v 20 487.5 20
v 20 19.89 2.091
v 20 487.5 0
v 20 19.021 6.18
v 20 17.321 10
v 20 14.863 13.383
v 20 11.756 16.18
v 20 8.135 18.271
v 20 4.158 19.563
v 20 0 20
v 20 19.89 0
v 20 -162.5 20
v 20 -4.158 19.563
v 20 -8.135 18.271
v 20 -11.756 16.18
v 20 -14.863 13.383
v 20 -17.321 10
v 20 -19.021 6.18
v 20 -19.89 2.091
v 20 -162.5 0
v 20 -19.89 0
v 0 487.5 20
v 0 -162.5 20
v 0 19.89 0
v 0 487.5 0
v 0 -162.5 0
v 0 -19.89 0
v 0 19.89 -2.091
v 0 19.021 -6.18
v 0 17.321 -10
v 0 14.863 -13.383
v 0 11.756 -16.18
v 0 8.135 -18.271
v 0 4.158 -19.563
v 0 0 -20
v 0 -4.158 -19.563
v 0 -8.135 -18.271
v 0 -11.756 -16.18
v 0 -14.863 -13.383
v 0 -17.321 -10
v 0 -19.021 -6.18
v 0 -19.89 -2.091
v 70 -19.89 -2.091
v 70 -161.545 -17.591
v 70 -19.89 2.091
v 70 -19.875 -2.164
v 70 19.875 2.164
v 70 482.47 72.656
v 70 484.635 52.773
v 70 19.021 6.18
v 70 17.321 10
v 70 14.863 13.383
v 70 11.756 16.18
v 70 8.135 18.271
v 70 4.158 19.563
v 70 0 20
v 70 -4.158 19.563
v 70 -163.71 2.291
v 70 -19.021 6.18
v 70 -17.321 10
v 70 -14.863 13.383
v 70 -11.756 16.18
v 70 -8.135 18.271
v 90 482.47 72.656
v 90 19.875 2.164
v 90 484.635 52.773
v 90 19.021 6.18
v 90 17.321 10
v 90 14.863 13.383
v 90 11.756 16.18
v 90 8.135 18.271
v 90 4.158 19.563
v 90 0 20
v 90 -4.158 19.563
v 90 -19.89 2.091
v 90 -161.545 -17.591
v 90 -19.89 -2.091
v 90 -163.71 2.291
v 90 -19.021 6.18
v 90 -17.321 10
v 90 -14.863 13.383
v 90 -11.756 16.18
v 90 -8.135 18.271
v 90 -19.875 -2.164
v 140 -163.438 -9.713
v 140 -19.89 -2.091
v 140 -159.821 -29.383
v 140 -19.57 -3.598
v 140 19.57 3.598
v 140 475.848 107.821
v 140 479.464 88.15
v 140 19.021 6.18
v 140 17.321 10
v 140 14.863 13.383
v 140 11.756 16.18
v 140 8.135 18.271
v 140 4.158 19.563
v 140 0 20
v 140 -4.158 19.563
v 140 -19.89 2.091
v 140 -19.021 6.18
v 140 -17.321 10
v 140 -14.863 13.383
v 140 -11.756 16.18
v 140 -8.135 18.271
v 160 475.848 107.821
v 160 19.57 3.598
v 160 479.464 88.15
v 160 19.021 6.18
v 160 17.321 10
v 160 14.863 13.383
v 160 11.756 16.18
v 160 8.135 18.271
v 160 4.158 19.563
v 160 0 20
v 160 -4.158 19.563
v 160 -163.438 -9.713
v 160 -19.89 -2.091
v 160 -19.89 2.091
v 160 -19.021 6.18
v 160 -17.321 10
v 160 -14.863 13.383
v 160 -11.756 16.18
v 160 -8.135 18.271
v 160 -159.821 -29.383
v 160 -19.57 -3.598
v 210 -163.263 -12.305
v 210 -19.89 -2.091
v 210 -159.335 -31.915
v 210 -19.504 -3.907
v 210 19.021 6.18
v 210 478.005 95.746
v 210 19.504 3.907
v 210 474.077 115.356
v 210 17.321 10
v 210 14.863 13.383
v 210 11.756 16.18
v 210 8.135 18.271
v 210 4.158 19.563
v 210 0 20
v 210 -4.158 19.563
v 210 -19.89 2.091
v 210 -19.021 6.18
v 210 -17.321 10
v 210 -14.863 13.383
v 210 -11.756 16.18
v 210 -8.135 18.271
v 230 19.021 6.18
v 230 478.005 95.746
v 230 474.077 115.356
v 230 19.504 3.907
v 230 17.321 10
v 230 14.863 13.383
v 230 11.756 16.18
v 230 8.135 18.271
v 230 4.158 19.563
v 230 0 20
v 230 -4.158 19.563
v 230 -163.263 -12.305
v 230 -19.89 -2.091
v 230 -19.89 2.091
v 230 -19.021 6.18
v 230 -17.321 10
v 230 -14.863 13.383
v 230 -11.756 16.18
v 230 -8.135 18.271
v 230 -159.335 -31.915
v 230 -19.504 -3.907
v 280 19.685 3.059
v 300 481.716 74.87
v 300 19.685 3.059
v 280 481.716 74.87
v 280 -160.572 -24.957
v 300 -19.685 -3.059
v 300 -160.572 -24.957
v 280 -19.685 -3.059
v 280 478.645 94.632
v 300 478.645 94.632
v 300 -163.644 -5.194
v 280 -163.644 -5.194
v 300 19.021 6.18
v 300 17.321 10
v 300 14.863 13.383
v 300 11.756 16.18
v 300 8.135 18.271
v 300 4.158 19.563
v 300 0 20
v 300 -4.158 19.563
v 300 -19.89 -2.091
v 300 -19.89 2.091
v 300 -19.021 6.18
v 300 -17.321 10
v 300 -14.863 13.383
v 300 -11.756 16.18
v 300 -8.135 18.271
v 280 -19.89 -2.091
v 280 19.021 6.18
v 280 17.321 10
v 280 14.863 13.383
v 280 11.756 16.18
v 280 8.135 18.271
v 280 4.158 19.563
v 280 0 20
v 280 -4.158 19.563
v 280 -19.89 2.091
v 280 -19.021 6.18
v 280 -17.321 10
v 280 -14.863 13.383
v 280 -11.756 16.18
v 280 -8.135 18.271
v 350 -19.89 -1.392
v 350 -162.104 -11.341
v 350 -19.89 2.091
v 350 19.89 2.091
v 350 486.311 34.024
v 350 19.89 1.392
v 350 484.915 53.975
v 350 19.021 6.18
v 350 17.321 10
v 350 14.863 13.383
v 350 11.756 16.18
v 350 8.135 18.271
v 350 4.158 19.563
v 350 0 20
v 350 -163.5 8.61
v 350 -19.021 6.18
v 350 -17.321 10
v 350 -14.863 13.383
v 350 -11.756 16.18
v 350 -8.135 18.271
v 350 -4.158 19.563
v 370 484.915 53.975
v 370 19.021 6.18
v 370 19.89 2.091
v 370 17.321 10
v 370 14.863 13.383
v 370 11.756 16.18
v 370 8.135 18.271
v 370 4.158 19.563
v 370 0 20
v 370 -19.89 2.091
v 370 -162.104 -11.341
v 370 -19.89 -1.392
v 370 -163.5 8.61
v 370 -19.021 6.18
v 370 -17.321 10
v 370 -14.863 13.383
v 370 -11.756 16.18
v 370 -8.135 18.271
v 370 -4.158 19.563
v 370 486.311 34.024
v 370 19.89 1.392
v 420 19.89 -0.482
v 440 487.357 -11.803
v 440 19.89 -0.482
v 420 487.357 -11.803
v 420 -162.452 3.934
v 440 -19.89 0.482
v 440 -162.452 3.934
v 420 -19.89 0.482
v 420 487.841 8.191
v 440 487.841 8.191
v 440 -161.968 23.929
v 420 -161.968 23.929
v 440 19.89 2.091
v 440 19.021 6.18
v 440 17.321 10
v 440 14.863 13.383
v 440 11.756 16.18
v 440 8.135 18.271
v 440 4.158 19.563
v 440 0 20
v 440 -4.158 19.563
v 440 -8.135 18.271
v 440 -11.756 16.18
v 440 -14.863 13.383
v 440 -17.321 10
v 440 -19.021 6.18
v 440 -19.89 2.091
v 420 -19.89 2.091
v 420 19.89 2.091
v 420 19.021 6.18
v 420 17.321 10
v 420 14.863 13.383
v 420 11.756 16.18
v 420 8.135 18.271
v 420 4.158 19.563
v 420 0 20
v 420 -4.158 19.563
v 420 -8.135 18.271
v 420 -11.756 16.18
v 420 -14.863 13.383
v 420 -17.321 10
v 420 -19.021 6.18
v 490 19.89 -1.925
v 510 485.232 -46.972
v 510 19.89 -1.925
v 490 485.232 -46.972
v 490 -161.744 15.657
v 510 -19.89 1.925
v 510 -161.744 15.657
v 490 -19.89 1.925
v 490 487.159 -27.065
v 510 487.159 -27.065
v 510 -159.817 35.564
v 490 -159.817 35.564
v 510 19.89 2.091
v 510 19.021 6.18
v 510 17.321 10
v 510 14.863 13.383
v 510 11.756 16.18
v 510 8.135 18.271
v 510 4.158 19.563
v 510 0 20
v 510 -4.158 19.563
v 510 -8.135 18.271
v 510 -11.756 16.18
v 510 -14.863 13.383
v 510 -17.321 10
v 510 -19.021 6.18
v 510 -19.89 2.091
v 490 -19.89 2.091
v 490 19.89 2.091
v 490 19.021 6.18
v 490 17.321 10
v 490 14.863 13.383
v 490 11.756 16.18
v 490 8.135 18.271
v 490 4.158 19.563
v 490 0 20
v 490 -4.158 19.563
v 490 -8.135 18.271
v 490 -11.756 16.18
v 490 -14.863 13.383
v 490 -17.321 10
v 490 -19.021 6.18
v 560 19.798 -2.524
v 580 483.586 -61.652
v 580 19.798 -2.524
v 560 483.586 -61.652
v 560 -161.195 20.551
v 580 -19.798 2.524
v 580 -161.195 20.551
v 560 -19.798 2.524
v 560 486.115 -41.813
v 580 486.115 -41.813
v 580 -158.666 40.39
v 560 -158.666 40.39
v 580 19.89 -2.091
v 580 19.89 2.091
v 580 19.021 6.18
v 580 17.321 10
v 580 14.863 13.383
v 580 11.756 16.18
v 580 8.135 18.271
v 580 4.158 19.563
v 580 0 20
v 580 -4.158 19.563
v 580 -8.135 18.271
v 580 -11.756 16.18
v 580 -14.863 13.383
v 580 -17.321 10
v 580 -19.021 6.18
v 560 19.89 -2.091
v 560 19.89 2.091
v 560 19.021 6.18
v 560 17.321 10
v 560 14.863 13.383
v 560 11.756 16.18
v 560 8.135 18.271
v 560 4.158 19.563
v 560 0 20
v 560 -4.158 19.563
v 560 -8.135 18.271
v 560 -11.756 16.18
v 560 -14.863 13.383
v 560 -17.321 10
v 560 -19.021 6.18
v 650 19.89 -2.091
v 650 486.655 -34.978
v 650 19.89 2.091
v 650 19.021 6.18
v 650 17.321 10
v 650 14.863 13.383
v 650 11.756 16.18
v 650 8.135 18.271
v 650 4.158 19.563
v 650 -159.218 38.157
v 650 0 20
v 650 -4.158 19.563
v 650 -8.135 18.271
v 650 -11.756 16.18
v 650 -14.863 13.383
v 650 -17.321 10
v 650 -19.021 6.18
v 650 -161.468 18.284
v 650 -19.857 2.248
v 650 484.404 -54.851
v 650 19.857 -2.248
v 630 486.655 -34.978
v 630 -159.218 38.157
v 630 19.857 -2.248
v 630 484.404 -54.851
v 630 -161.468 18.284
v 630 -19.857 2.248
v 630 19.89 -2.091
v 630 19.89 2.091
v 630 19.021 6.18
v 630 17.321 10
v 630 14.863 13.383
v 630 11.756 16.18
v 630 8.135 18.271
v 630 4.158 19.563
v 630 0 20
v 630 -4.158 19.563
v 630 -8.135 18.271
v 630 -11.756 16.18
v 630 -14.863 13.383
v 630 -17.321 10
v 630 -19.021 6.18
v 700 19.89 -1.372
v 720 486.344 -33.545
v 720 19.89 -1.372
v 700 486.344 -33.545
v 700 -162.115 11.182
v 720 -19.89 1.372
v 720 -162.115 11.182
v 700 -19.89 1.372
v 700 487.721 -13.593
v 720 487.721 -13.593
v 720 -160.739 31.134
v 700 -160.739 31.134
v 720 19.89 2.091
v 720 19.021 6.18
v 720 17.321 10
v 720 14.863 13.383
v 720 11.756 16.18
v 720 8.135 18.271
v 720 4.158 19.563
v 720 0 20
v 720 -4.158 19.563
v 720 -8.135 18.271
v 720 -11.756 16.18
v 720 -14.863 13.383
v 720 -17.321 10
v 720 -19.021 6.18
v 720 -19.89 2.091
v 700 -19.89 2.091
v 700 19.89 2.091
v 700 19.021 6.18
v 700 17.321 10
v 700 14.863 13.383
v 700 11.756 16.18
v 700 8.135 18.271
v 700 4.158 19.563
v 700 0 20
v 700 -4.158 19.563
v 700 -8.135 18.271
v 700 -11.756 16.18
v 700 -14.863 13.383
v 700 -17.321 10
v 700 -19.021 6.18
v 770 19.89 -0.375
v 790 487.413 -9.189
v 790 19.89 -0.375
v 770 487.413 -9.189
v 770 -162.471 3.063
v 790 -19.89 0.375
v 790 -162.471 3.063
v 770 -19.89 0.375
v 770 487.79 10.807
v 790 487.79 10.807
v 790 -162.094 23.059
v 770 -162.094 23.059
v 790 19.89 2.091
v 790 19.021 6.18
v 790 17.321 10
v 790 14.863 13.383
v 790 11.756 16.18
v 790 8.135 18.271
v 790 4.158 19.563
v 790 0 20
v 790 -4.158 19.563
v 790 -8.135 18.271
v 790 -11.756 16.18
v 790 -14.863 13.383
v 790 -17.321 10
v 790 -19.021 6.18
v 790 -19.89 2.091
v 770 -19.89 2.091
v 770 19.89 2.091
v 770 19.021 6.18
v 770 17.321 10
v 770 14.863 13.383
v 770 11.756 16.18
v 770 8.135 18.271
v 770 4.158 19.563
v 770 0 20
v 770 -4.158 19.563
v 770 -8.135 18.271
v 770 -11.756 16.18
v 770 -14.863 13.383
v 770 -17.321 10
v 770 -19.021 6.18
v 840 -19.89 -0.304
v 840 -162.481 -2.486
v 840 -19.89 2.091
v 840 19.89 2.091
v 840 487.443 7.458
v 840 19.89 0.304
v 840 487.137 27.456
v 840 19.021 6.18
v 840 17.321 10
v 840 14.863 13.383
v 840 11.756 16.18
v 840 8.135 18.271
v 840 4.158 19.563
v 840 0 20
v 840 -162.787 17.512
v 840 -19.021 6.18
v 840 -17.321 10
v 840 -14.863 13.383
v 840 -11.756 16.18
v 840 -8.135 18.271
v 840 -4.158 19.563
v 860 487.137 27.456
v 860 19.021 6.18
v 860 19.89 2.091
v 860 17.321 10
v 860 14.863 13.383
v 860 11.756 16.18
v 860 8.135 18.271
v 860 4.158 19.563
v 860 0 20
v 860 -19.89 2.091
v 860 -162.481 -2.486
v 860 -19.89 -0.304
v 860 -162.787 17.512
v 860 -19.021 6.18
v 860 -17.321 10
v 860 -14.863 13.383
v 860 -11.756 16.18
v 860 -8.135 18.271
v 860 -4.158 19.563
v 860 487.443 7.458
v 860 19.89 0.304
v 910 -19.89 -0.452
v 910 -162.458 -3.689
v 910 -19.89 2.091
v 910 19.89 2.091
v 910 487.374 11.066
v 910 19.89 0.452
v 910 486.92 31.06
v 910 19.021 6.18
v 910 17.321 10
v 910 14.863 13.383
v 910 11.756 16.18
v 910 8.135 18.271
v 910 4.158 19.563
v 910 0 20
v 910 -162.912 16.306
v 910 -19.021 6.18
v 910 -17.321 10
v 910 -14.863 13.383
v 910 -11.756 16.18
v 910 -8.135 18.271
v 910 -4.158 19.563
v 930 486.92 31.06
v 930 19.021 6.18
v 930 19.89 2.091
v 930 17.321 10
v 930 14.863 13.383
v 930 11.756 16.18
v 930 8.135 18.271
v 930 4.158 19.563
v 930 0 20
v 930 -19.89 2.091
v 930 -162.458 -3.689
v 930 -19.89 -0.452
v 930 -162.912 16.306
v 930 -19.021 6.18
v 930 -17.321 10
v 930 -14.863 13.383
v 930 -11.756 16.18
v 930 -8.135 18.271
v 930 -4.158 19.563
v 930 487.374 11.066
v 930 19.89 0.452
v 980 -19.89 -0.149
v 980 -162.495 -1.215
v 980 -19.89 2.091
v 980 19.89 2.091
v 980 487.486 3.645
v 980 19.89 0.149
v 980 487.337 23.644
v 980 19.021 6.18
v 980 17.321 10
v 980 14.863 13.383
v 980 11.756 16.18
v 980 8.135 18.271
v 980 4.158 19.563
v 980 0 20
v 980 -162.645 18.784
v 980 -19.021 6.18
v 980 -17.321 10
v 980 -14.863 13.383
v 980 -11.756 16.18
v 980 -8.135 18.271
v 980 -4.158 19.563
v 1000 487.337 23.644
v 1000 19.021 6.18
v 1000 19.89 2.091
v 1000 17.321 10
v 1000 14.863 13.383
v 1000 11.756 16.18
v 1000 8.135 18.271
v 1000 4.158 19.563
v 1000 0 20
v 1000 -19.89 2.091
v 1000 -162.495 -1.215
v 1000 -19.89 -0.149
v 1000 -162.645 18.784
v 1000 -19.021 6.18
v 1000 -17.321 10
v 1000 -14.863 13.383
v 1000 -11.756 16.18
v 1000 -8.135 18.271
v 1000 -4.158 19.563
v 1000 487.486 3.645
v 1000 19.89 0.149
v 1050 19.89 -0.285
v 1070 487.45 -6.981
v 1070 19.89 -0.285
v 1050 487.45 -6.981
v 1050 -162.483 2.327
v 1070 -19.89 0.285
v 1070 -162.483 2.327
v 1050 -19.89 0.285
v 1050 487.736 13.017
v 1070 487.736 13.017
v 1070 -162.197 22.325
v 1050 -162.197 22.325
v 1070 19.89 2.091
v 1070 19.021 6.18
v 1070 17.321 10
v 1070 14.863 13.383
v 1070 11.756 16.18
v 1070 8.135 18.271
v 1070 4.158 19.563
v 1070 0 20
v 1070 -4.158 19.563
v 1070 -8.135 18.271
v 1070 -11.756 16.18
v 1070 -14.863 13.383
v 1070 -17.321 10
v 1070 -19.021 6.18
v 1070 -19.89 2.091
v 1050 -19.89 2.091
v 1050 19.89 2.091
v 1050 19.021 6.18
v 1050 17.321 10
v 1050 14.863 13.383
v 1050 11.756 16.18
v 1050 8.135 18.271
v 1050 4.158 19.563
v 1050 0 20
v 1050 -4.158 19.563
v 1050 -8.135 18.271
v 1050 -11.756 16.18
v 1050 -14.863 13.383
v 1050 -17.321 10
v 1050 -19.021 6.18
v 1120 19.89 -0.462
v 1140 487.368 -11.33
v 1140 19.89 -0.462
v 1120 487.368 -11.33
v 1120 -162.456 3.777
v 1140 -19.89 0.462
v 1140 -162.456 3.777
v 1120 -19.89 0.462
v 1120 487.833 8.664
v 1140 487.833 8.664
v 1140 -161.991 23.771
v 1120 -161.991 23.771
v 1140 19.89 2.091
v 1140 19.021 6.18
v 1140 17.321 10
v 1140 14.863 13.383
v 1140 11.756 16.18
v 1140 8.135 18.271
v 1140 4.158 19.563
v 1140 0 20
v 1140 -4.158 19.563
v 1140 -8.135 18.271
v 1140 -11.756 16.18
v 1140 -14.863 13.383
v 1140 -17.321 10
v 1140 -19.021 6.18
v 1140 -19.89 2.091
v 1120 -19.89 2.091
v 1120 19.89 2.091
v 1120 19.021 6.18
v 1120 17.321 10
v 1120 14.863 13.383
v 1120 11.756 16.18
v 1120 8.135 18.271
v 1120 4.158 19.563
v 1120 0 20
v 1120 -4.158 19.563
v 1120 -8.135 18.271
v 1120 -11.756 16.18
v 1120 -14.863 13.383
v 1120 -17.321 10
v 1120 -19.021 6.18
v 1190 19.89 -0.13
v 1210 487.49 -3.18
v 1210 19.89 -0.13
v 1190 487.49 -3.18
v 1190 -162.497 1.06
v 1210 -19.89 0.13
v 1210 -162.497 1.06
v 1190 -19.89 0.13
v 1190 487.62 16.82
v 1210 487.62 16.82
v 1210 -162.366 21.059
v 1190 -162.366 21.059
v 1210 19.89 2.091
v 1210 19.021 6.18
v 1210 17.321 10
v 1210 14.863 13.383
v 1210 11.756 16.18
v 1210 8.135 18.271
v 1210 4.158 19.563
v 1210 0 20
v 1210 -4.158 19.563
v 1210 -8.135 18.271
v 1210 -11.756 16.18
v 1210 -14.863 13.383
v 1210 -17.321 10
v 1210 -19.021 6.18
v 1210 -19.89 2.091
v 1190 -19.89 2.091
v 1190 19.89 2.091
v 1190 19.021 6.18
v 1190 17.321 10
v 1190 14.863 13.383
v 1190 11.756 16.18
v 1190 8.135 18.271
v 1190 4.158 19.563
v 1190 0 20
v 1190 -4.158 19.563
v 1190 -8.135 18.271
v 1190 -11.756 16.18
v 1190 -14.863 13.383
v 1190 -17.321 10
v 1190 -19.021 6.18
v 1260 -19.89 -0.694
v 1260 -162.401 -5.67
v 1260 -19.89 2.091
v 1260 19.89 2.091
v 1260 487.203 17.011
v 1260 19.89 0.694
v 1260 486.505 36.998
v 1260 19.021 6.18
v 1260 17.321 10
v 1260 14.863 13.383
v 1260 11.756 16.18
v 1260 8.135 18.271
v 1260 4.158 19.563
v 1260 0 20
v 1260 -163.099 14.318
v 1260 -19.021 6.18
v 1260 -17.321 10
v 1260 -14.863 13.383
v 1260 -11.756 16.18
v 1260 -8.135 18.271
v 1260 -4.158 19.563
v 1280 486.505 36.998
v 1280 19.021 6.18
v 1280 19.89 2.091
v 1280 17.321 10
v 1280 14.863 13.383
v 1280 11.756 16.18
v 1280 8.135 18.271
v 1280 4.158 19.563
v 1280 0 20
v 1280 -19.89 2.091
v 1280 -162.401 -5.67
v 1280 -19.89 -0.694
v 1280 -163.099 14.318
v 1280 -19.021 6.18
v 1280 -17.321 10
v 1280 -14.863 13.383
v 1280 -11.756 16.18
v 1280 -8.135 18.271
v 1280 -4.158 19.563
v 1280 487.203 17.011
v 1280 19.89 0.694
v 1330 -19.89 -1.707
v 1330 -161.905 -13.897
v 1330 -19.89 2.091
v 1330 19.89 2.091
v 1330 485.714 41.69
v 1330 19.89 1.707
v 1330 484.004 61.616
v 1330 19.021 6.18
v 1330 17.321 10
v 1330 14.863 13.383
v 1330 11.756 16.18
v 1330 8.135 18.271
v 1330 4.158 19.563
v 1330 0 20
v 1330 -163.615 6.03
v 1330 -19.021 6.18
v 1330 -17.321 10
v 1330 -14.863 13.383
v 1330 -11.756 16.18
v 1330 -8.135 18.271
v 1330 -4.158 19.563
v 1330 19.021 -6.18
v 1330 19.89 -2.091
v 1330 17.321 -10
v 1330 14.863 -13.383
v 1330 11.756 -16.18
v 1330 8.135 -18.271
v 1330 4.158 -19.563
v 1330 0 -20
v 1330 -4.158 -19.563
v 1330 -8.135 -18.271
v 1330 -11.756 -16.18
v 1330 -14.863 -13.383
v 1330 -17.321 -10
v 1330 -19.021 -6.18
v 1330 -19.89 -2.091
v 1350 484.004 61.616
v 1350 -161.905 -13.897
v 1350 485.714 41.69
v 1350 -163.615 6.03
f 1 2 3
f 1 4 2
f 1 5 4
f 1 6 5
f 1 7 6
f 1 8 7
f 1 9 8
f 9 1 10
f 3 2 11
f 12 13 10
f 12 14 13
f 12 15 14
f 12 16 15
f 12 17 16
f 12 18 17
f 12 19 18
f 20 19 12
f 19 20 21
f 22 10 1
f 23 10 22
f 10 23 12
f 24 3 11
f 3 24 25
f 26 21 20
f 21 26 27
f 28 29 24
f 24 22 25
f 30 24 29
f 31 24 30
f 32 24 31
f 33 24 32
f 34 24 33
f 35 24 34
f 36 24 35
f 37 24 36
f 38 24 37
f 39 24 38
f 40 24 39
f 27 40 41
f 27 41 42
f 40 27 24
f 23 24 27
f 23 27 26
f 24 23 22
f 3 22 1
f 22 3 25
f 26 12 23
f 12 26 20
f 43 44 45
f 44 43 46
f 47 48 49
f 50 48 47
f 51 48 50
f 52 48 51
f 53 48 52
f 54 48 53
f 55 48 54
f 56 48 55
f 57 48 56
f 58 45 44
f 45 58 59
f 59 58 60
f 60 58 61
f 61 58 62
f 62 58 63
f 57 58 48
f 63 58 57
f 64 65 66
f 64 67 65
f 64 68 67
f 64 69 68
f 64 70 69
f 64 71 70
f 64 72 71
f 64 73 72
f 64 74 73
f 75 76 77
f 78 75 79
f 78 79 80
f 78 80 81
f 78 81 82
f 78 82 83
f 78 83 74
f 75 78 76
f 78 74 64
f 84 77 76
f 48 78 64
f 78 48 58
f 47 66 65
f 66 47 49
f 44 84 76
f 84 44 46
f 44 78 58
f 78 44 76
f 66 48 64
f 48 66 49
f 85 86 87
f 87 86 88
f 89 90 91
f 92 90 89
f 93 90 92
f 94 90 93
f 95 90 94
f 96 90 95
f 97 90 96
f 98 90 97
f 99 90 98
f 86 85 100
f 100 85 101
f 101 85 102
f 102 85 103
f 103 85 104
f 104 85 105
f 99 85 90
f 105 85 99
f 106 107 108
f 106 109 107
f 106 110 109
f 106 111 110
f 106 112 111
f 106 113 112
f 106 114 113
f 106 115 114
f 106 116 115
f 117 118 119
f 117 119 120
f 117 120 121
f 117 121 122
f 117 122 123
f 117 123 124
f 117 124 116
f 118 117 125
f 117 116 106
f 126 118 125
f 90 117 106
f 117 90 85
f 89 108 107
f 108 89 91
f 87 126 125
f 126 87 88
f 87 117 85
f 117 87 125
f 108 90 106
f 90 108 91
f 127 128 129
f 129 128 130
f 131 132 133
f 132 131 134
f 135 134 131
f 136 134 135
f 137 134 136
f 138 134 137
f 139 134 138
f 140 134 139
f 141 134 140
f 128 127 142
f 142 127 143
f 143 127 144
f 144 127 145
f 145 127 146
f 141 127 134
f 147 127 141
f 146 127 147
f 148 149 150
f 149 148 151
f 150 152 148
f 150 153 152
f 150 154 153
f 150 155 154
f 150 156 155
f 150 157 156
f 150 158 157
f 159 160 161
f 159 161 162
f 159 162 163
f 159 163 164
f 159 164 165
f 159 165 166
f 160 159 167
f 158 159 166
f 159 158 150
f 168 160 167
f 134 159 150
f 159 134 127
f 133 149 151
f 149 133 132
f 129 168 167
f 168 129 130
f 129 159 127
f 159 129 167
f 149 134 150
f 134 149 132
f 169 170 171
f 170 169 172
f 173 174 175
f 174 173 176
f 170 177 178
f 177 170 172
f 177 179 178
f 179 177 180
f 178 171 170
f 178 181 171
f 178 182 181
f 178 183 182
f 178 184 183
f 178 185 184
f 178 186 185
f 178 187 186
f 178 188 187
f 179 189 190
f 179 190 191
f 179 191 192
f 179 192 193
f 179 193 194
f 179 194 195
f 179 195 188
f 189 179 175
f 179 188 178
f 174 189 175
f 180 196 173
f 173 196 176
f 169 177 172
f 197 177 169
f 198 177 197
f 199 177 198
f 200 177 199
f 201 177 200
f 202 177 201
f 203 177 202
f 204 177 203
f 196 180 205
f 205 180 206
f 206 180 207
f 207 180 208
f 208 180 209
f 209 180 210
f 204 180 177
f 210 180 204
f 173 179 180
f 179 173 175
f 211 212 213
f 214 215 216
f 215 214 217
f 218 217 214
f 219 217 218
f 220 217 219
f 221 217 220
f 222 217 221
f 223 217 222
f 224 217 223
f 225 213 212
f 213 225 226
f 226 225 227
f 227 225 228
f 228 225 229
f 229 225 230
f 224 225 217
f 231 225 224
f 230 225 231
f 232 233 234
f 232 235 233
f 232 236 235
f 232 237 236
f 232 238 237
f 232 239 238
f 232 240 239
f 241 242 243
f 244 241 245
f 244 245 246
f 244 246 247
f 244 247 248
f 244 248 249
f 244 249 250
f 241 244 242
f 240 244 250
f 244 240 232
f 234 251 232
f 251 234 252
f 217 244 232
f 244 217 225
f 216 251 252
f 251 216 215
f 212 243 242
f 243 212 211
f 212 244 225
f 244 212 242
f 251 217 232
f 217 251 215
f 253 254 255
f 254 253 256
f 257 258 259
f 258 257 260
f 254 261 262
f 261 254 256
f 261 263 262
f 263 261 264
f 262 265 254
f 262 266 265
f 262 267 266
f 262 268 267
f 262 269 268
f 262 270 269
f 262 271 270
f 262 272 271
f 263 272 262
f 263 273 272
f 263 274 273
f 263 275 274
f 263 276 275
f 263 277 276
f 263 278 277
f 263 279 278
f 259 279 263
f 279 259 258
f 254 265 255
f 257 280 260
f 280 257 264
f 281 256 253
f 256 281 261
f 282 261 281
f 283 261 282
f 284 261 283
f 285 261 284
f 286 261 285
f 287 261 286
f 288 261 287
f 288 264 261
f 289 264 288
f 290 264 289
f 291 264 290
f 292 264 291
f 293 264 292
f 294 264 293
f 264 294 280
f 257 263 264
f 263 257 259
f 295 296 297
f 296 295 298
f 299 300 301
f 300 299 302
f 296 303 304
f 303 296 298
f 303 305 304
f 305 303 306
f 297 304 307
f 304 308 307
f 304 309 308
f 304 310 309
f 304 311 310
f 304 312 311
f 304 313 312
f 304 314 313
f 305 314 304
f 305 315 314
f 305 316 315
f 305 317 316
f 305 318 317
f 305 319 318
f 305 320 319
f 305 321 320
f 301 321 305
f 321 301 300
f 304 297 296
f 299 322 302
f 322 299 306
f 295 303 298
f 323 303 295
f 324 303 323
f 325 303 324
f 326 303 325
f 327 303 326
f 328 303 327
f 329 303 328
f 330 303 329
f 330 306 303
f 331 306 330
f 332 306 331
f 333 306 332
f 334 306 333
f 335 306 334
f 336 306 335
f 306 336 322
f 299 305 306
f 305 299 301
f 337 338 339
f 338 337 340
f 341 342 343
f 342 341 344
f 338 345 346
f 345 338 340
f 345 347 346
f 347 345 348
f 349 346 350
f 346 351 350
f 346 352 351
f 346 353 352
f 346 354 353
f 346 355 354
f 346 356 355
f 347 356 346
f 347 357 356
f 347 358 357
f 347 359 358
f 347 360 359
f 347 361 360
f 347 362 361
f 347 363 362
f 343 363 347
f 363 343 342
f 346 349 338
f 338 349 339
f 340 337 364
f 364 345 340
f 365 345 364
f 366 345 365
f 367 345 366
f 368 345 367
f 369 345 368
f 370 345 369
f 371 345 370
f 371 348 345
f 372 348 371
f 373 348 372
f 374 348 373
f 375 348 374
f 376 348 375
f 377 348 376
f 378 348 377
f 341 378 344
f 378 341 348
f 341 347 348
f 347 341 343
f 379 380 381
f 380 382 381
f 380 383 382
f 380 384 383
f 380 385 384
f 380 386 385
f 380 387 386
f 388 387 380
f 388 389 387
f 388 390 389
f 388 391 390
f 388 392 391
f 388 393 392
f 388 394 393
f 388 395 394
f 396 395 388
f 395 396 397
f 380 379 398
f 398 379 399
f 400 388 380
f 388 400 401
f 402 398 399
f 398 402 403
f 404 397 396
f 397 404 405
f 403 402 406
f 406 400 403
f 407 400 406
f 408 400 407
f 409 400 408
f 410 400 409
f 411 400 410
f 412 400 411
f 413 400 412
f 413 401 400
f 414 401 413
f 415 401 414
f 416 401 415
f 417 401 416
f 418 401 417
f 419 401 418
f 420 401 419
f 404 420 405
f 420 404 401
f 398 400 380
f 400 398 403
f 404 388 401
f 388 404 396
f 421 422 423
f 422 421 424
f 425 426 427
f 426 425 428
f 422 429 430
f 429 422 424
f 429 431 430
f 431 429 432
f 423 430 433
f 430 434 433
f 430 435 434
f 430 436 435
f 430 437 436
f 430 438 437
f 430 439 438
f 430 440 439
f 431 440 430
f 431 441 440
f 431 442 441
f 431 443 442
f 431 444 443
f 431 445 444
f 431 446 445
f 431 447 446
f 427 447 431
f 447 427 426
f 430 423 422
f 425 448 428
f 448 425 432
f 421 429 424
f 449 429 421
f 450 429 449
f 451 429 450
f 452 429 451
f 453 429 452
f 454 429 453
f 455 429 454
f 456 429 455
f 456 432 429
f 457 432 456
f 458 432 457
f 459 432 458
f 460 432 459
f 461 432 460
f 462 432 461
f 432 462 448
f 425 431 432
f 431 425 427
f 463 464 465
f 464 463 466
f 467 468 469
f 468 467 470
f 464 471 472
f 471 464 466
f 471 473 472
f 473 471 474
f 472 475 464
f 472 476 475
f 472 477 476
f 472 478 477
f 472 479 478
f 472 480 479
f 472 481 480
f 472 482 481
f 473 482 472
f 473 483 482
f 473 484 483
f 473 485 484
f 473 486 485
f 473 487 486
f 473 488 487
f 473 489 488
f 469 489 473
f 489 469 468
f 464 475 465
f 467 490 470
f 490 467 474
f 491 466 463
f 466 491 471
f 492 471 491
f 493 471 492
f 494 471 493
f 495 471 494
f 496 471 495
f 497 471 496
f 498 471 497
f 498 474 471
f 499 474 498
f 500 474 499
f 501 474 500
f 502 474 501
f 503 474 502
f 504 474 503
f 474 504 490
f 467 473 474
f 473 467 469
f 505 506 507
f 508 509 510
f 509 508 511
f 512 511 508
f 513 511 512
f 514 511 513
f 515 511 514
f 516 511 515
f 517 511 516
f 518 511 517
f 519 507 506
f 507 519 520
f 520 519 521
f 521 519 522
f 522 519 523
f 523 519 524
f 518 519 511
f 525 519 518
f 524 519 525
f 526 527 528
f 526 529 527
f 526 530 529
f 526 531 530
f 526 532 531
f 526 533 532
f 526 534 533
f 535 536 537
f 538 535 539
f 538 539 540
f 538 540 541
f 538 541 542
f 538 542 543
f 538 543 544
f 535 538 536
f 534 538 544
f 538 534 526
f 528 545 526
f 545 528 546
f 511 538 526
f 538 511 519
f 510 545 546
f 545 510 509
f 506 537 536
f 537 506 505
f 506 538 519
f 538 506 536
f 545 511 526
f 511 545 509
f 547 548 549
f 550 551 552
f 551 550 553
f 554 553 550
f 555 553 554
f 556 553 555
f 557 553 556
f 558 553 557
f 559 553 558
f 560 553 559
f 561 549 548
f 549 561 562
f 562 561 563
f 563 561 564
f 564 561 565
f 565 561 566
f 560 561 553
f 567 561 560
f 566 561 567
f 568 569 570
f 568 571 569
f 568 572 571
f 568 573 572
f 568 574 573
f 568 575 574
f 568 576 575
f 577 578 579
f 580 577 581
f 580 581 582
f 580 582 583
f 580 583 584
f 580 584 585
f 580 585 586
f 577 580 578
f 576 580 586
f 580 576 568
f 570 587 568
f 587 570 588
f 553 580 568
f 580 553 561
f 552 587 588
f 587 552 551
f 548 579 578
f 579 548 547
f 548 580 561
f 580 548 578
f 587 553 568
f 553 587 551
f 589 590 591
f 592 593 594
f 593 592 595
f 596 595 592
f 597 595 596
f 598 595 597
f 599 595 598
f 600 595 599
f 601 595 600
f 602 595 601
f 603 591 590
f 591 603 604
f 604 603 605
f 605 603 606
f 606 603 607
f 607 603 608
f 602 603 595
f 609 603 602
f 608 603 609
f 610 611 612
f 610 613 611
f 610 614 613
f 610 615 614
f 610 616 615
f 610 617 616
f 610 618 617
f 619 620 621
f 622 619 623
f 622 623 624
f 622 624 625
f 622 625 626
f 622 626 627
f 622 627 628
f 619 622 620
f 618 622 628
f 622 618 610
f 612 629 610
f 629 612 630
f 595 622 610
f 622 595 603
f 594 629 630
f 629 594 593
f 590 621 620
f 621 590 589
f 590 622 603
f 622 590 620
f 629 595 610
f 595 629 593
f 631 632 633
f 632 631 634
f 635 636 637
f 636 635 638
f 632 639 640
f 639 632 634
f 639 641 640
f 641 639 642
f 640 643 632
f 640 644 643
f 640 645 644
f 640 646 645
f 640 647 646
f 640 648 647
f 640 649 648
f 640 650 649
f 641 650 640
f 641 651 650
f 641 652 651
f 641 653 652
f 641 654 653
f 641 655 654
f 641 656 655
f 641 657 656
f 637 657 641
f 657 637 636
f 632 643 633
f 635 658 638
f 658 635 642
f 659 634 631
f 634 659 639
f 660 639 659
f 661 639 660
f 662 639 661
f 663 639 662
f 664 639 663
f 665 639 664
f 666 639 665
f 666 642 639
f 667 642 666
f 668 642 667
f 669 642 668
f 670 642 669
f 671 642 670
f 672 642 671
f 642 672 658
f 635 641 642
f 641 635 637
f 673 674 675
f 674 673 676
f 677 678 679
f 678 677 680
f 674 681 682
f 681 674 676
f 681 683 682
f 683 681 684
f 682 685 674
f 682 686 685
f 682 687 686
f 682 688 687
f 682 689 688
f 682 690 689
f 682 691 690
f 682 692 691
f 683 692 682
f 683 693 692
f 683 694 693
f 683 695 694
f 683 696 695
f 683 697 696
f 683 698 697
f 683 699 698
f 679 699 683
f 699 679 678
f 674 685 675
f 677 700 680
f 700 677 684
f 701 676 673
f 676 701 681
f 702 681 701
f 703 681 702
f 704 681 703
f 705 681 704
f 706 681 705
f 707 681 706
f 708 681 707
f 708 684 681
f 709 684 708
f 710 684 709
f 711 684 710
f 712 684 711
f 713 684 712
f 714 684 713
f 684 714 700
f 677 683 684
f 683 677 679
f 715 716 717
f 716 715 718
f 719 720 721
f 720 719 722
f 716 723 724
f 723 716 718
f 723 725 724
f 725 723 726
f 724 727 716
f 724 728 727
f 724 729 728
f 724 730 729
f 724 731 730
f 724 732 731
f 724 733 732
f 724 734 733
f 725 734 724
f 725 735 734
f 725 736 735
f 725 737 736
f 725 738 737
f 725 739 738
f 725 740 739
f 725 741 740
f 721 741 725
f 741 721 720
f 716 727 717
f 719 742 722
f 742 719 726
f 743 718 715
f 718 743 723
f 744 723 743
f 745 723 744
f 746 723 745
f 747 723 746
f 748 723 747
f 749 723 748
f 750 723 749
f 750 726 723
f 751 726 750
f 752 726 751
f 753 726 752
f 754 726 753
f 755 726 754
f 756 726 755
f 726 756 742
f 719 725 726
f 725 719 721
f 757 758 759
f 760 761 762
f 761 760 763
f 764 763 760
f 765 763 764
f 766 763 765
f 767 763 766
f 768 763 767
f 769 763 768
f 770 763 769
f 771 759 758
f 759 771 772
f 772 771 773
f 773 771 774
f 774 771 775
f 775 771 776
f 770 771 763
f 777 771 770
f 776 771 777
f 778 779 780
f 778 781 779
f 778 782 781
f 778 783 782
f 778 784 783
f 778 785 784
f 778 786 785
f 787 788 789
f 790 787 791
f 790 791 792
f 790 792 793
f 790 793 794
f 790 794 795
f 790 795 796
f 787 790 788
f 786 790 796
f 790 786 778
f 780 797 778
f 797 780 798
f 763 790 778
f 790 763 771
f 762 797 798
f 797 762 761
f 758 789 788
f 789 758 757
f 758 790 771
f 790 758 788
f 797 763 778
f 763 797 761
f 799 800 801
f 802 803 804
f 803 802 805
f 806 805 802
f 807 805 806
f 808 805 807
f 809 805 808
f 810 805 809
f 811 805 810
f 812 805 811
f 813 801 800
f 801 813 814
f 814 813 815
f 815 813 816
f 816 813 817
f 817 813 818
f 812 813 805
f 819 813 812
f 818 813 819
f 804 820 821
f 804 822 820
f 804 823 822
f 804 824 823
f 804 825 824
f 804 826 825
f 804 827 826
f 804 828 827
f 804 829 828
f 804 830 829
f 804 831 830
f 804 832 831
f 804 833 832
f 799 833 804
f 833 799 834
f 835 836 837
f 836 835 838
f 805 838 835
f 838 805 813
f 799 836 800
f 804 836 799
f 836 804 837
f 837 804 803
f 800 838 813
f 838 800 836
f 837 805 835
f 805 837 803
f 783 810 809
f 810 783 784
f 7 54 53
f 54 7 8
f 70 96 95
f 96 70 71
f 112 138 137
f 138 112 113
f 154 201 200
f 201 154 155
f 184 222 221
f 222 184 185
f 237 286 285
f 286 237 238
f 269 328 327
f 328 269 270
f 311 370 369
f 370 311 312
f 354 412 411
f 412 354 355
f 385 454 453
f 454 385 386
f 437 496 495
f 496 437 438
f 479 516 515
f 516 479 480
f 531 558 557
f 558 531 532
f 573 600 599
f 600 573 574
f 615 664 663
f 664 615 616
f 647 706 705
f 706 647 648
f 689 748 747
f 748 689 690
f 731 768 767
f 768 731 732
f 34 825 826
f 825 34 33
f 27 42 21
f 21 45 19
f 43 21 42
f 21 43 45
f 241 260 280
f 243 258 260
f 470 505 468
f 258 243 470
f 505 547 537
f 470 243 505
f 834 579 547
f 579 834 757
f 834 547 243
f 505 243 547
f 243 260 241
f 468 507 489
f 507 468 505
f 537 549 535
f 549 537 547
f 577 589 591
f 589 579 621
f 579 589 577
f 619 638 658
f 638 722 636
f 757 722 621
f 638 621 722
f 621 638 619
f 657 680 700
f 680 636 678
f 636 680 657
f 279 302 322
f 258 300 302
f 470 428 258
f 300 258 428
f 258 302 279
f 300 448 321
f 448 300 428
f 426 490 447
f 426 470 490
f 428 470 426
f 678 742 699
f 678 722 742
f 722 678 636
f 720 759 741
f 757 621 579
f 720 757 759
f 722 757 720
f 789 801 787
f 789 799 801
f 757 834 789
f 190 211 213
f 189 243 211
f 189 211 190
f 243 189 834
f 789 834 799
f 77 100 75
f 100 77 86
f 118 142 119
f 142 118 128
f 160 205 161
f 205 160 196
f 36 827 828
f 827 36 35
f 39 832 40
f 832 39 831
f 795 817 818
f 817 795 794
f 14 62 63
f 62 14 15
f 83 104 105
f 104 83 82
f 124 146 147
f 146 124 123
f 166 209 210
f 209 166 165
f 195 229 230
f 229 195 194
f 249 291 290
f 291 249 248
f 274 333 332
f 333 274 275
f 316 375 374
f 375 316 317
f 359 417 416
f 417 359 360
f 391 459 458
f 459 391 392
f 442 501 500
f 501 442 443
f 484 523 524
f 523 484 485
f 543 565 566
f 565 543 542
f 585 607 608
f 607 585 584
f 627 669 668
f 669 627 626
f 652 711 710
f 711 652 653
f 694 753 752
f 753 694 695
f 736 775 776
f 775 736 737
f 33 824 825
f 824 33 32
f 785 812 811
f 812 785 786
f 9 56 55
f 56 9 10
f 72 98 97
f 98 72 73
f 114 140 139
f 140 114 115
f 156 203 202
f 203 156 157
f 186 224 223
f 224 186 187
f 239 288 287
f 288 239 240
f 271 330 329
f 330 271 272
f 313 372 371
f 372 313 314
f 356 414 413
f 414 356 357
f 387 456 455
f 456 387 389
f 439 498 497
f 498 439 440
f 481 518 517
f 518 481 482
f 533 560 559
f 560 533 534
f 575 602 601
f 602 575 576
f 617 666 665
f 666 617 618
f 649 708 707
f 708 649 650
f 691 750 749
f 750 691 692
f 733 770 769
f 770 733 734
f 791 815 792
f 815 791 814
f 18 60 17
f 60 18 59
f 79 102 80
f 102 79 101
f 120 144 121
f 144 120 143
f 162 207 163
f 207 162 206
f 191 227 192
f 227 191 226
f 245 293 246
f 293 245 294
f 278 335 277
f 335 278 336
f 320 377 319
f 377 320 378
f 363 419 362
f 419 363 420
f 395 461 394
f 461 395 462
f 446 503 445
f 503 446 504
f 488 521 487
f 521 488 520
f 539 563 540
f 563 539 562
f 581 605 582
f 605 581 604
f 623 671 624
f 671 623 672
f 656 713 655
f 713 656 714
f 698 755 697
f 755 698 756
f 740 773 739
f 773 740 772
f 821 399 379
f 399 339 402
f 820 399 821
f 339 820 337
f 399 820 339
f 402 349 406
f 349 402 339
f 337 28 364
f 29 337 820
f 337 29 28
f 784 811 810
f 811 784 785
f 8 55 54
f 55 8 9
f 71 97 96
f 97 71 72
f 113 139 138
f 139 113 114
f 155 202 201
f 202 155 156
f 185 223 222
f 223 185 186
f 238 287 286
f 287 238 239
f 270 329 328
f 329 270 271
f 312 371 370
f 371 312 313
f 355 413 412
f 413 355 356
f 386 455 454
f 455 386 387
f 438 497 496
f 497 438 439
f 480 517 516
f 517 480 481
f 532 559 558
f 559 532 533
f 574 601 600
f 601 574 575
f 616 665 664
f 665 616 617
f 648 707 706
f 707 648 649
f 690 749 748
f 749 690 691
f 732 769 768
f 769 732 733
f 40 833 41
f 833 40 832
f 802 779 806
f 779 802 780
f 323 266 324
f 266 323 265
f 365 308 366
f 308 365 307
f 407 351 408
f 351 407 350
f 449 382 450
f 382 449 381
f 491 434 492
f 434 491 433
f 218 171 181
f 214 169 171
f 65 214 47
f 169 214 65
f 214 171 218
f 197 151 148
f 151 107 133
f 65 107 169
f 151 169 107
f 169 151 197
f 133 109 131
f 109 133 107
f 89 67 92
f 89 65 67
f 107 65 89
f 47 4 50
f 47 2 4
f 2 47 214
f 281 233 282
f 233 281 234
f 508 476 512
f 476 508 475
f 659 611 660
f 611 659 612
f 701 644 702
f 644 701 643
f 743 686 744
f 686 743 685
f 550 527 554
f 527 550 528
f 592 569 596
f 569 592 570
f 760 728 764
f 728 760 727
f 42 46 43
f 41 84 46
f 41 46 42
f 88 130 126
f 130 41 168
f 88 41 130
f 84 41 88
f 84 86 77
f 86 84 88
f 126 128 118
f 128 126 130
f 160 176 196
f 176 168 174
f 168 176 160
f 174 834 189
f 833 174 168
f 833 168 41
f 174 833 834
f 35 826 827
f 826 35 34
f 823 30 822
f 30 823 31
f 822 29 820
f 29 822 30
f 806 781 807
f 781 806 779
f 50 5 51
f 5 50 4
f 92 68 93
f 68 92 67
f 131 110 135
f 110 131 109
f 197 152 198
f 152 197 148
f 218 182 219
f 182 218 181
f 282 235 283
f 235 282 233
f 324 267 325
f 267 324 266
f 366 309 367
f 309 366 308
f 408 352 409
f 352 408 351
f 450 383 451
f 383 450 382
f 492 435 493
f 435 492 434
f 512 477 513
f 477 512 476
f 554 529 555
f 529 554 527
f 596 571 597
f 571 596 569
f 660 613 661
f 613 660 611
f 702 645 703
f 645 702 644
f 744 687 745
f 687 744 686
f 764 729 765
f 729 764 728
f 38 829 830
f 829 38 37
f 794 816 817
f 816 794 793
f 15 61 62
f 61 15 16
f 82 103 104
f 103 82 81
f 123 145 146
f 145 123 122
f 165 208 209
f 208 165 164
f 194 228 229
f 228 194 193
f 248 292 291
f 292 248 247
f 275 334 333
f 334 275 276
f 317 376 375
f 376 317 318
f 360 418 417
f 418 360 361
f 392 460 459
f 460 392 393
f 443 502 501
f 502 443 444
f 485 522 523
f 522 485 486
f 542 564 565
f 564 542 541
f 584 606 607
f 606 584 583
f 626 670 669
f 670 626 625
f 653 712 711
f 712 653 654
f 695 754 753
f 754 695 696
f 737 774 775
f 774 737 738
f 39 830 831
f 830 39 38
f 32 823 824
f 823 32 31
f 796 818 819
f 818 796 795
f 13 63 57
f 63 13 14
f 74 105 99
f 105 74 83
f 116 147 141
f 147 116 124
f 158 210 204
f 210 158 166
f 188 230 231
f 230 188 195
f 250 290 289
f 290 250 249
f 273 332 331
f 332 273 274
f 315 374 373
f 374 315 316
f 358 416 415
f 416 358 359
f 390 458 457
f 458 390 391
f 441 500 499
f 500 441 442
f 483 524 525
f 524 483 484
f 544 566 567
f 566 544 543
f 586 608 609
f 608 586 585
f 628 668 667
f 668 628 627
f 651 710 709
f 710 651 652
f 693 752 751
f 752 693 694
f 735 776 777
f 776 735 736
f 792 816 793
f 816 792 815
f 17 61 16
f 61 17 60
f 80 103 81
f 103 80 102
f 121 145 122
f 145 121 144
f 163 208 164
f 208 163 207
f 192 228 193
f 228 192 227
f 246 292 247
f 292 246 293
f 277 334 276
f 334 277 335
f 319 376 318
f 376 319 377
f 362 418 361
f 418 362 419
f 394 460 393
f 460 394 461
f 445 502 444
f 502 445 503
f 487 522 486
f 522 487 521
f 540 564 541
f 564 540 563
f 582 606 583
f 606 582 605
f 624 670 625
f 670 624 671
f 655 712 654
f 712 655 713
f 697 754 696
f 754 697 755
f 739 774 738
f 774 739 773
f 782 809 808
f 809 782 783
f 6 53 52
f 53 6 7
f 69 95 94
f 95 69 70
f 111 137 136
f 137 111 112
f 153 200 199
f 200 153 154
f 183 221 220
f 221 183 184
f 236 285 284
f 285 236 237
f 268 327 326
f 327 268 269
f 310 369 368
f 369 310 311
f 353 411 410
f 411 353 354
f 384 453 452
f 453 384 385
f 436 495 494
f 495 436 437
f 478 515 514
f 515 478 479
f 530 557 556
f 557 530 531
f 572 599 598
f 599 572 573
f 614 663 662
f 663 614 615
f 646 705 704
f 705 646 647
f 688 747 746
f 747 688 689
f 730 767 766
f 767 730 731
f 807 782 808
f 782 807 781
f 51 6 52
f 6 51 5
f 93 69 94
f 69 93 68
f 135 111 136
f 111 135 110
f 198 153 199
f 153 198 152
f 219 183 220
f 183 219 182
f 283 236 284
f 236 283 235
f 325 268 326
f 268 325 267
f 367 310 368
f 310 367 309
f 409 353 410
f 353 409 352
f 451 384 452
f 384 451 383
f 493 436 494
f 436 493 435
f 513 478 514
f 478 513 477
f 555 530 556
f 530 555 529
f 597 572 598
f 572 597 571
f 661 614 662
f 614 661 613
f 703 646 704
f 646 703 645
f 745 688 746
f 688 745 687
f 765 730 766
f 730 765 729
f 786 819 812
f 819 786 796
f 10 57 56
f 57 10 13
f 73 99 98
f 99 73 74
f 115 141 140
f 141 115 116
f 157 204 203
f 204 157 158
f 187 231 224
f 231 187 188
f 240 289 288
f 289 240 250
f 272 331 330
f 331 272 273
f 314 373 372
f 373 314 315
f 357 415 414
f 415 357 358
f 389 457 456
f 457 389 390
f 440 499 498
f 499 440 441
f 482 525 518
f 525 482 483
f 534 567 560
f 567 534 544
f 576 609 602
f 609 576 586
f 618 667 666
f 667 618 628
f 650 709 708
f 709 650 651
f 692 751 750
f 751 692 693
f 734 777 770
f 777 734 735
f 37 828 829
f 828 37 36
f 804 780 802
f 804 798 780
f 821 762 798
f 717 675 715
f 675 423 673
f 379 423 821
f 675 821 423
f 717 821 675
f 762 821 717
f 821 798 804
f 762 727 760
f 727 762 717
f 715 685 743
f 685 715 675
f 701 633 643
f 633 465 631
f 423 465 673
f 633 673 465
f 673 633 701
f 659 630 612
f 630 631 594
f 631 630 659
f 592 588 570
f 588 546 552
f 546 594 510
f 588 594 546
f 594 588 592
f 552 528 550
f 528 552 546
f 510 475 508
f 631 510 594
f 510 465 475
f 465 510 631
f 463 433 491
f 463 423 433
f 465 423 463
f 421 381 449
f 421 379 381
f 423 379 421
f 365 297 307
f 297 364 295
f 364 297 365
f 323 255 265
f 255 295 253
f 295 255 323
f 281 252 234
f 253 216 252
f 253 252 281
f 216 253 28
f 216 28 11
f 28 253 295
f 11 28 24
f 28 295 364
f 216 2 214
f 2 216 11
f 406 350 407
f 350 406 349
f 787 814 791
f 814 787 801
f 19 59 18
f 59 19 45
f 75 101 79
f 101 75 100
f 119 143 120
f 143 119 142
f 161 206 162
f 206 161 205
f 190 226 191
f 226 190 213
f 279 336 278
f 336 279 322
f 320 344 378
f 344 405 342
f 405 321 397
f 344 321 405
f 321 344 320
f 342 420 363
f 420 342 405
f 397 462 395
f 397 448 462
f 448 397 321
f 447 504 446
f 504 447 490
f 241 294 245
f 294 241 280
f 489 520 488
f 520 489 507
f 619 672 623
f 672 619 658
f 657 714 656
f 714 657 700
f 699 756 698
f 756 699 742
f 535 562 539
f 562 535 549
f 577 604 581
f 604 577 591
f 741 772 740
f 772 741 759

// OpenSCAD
// file: light_pipe.scad
include <constants.scad>

module light_pipe() {
	cube([light_pipe_side,light_pipe_length,light_pipe_side]);
}
// file: constants.scad
light_pipe_side = 20;
light_pipe_length = 650;

light_pipes = 20;

light_pipe_pivot = 650/4;
light_pipe_separation = 50;

rotation_amplitude = 6;


function rotate_light(k) = 
	rotation_amplitude * sin(k*3.14 *12) + 
	rotation_amplitude * sin(k*8*3.14);
// main file
include <constants.scad>
include <light_pipe.scad>

module shifted_pipe() {
	translate([0, -light_pipe_pivot, 0]) {
		light_pipe();
	}
}


module lamp() {
	
	for (k = [0:light_pipes-1]) {

		translate([k*(light_pipe_separation+light_pipe_side), 0, 0]) 			{
			rotate([rotate_light(k),0,0])
			shifted_pipe();
		}
	}

	rotate([0,90,0])
	cylinder(d=40, h=(light_pipes-1) * (light_pipe_side + light_pipe_separation));

}


lamp();
